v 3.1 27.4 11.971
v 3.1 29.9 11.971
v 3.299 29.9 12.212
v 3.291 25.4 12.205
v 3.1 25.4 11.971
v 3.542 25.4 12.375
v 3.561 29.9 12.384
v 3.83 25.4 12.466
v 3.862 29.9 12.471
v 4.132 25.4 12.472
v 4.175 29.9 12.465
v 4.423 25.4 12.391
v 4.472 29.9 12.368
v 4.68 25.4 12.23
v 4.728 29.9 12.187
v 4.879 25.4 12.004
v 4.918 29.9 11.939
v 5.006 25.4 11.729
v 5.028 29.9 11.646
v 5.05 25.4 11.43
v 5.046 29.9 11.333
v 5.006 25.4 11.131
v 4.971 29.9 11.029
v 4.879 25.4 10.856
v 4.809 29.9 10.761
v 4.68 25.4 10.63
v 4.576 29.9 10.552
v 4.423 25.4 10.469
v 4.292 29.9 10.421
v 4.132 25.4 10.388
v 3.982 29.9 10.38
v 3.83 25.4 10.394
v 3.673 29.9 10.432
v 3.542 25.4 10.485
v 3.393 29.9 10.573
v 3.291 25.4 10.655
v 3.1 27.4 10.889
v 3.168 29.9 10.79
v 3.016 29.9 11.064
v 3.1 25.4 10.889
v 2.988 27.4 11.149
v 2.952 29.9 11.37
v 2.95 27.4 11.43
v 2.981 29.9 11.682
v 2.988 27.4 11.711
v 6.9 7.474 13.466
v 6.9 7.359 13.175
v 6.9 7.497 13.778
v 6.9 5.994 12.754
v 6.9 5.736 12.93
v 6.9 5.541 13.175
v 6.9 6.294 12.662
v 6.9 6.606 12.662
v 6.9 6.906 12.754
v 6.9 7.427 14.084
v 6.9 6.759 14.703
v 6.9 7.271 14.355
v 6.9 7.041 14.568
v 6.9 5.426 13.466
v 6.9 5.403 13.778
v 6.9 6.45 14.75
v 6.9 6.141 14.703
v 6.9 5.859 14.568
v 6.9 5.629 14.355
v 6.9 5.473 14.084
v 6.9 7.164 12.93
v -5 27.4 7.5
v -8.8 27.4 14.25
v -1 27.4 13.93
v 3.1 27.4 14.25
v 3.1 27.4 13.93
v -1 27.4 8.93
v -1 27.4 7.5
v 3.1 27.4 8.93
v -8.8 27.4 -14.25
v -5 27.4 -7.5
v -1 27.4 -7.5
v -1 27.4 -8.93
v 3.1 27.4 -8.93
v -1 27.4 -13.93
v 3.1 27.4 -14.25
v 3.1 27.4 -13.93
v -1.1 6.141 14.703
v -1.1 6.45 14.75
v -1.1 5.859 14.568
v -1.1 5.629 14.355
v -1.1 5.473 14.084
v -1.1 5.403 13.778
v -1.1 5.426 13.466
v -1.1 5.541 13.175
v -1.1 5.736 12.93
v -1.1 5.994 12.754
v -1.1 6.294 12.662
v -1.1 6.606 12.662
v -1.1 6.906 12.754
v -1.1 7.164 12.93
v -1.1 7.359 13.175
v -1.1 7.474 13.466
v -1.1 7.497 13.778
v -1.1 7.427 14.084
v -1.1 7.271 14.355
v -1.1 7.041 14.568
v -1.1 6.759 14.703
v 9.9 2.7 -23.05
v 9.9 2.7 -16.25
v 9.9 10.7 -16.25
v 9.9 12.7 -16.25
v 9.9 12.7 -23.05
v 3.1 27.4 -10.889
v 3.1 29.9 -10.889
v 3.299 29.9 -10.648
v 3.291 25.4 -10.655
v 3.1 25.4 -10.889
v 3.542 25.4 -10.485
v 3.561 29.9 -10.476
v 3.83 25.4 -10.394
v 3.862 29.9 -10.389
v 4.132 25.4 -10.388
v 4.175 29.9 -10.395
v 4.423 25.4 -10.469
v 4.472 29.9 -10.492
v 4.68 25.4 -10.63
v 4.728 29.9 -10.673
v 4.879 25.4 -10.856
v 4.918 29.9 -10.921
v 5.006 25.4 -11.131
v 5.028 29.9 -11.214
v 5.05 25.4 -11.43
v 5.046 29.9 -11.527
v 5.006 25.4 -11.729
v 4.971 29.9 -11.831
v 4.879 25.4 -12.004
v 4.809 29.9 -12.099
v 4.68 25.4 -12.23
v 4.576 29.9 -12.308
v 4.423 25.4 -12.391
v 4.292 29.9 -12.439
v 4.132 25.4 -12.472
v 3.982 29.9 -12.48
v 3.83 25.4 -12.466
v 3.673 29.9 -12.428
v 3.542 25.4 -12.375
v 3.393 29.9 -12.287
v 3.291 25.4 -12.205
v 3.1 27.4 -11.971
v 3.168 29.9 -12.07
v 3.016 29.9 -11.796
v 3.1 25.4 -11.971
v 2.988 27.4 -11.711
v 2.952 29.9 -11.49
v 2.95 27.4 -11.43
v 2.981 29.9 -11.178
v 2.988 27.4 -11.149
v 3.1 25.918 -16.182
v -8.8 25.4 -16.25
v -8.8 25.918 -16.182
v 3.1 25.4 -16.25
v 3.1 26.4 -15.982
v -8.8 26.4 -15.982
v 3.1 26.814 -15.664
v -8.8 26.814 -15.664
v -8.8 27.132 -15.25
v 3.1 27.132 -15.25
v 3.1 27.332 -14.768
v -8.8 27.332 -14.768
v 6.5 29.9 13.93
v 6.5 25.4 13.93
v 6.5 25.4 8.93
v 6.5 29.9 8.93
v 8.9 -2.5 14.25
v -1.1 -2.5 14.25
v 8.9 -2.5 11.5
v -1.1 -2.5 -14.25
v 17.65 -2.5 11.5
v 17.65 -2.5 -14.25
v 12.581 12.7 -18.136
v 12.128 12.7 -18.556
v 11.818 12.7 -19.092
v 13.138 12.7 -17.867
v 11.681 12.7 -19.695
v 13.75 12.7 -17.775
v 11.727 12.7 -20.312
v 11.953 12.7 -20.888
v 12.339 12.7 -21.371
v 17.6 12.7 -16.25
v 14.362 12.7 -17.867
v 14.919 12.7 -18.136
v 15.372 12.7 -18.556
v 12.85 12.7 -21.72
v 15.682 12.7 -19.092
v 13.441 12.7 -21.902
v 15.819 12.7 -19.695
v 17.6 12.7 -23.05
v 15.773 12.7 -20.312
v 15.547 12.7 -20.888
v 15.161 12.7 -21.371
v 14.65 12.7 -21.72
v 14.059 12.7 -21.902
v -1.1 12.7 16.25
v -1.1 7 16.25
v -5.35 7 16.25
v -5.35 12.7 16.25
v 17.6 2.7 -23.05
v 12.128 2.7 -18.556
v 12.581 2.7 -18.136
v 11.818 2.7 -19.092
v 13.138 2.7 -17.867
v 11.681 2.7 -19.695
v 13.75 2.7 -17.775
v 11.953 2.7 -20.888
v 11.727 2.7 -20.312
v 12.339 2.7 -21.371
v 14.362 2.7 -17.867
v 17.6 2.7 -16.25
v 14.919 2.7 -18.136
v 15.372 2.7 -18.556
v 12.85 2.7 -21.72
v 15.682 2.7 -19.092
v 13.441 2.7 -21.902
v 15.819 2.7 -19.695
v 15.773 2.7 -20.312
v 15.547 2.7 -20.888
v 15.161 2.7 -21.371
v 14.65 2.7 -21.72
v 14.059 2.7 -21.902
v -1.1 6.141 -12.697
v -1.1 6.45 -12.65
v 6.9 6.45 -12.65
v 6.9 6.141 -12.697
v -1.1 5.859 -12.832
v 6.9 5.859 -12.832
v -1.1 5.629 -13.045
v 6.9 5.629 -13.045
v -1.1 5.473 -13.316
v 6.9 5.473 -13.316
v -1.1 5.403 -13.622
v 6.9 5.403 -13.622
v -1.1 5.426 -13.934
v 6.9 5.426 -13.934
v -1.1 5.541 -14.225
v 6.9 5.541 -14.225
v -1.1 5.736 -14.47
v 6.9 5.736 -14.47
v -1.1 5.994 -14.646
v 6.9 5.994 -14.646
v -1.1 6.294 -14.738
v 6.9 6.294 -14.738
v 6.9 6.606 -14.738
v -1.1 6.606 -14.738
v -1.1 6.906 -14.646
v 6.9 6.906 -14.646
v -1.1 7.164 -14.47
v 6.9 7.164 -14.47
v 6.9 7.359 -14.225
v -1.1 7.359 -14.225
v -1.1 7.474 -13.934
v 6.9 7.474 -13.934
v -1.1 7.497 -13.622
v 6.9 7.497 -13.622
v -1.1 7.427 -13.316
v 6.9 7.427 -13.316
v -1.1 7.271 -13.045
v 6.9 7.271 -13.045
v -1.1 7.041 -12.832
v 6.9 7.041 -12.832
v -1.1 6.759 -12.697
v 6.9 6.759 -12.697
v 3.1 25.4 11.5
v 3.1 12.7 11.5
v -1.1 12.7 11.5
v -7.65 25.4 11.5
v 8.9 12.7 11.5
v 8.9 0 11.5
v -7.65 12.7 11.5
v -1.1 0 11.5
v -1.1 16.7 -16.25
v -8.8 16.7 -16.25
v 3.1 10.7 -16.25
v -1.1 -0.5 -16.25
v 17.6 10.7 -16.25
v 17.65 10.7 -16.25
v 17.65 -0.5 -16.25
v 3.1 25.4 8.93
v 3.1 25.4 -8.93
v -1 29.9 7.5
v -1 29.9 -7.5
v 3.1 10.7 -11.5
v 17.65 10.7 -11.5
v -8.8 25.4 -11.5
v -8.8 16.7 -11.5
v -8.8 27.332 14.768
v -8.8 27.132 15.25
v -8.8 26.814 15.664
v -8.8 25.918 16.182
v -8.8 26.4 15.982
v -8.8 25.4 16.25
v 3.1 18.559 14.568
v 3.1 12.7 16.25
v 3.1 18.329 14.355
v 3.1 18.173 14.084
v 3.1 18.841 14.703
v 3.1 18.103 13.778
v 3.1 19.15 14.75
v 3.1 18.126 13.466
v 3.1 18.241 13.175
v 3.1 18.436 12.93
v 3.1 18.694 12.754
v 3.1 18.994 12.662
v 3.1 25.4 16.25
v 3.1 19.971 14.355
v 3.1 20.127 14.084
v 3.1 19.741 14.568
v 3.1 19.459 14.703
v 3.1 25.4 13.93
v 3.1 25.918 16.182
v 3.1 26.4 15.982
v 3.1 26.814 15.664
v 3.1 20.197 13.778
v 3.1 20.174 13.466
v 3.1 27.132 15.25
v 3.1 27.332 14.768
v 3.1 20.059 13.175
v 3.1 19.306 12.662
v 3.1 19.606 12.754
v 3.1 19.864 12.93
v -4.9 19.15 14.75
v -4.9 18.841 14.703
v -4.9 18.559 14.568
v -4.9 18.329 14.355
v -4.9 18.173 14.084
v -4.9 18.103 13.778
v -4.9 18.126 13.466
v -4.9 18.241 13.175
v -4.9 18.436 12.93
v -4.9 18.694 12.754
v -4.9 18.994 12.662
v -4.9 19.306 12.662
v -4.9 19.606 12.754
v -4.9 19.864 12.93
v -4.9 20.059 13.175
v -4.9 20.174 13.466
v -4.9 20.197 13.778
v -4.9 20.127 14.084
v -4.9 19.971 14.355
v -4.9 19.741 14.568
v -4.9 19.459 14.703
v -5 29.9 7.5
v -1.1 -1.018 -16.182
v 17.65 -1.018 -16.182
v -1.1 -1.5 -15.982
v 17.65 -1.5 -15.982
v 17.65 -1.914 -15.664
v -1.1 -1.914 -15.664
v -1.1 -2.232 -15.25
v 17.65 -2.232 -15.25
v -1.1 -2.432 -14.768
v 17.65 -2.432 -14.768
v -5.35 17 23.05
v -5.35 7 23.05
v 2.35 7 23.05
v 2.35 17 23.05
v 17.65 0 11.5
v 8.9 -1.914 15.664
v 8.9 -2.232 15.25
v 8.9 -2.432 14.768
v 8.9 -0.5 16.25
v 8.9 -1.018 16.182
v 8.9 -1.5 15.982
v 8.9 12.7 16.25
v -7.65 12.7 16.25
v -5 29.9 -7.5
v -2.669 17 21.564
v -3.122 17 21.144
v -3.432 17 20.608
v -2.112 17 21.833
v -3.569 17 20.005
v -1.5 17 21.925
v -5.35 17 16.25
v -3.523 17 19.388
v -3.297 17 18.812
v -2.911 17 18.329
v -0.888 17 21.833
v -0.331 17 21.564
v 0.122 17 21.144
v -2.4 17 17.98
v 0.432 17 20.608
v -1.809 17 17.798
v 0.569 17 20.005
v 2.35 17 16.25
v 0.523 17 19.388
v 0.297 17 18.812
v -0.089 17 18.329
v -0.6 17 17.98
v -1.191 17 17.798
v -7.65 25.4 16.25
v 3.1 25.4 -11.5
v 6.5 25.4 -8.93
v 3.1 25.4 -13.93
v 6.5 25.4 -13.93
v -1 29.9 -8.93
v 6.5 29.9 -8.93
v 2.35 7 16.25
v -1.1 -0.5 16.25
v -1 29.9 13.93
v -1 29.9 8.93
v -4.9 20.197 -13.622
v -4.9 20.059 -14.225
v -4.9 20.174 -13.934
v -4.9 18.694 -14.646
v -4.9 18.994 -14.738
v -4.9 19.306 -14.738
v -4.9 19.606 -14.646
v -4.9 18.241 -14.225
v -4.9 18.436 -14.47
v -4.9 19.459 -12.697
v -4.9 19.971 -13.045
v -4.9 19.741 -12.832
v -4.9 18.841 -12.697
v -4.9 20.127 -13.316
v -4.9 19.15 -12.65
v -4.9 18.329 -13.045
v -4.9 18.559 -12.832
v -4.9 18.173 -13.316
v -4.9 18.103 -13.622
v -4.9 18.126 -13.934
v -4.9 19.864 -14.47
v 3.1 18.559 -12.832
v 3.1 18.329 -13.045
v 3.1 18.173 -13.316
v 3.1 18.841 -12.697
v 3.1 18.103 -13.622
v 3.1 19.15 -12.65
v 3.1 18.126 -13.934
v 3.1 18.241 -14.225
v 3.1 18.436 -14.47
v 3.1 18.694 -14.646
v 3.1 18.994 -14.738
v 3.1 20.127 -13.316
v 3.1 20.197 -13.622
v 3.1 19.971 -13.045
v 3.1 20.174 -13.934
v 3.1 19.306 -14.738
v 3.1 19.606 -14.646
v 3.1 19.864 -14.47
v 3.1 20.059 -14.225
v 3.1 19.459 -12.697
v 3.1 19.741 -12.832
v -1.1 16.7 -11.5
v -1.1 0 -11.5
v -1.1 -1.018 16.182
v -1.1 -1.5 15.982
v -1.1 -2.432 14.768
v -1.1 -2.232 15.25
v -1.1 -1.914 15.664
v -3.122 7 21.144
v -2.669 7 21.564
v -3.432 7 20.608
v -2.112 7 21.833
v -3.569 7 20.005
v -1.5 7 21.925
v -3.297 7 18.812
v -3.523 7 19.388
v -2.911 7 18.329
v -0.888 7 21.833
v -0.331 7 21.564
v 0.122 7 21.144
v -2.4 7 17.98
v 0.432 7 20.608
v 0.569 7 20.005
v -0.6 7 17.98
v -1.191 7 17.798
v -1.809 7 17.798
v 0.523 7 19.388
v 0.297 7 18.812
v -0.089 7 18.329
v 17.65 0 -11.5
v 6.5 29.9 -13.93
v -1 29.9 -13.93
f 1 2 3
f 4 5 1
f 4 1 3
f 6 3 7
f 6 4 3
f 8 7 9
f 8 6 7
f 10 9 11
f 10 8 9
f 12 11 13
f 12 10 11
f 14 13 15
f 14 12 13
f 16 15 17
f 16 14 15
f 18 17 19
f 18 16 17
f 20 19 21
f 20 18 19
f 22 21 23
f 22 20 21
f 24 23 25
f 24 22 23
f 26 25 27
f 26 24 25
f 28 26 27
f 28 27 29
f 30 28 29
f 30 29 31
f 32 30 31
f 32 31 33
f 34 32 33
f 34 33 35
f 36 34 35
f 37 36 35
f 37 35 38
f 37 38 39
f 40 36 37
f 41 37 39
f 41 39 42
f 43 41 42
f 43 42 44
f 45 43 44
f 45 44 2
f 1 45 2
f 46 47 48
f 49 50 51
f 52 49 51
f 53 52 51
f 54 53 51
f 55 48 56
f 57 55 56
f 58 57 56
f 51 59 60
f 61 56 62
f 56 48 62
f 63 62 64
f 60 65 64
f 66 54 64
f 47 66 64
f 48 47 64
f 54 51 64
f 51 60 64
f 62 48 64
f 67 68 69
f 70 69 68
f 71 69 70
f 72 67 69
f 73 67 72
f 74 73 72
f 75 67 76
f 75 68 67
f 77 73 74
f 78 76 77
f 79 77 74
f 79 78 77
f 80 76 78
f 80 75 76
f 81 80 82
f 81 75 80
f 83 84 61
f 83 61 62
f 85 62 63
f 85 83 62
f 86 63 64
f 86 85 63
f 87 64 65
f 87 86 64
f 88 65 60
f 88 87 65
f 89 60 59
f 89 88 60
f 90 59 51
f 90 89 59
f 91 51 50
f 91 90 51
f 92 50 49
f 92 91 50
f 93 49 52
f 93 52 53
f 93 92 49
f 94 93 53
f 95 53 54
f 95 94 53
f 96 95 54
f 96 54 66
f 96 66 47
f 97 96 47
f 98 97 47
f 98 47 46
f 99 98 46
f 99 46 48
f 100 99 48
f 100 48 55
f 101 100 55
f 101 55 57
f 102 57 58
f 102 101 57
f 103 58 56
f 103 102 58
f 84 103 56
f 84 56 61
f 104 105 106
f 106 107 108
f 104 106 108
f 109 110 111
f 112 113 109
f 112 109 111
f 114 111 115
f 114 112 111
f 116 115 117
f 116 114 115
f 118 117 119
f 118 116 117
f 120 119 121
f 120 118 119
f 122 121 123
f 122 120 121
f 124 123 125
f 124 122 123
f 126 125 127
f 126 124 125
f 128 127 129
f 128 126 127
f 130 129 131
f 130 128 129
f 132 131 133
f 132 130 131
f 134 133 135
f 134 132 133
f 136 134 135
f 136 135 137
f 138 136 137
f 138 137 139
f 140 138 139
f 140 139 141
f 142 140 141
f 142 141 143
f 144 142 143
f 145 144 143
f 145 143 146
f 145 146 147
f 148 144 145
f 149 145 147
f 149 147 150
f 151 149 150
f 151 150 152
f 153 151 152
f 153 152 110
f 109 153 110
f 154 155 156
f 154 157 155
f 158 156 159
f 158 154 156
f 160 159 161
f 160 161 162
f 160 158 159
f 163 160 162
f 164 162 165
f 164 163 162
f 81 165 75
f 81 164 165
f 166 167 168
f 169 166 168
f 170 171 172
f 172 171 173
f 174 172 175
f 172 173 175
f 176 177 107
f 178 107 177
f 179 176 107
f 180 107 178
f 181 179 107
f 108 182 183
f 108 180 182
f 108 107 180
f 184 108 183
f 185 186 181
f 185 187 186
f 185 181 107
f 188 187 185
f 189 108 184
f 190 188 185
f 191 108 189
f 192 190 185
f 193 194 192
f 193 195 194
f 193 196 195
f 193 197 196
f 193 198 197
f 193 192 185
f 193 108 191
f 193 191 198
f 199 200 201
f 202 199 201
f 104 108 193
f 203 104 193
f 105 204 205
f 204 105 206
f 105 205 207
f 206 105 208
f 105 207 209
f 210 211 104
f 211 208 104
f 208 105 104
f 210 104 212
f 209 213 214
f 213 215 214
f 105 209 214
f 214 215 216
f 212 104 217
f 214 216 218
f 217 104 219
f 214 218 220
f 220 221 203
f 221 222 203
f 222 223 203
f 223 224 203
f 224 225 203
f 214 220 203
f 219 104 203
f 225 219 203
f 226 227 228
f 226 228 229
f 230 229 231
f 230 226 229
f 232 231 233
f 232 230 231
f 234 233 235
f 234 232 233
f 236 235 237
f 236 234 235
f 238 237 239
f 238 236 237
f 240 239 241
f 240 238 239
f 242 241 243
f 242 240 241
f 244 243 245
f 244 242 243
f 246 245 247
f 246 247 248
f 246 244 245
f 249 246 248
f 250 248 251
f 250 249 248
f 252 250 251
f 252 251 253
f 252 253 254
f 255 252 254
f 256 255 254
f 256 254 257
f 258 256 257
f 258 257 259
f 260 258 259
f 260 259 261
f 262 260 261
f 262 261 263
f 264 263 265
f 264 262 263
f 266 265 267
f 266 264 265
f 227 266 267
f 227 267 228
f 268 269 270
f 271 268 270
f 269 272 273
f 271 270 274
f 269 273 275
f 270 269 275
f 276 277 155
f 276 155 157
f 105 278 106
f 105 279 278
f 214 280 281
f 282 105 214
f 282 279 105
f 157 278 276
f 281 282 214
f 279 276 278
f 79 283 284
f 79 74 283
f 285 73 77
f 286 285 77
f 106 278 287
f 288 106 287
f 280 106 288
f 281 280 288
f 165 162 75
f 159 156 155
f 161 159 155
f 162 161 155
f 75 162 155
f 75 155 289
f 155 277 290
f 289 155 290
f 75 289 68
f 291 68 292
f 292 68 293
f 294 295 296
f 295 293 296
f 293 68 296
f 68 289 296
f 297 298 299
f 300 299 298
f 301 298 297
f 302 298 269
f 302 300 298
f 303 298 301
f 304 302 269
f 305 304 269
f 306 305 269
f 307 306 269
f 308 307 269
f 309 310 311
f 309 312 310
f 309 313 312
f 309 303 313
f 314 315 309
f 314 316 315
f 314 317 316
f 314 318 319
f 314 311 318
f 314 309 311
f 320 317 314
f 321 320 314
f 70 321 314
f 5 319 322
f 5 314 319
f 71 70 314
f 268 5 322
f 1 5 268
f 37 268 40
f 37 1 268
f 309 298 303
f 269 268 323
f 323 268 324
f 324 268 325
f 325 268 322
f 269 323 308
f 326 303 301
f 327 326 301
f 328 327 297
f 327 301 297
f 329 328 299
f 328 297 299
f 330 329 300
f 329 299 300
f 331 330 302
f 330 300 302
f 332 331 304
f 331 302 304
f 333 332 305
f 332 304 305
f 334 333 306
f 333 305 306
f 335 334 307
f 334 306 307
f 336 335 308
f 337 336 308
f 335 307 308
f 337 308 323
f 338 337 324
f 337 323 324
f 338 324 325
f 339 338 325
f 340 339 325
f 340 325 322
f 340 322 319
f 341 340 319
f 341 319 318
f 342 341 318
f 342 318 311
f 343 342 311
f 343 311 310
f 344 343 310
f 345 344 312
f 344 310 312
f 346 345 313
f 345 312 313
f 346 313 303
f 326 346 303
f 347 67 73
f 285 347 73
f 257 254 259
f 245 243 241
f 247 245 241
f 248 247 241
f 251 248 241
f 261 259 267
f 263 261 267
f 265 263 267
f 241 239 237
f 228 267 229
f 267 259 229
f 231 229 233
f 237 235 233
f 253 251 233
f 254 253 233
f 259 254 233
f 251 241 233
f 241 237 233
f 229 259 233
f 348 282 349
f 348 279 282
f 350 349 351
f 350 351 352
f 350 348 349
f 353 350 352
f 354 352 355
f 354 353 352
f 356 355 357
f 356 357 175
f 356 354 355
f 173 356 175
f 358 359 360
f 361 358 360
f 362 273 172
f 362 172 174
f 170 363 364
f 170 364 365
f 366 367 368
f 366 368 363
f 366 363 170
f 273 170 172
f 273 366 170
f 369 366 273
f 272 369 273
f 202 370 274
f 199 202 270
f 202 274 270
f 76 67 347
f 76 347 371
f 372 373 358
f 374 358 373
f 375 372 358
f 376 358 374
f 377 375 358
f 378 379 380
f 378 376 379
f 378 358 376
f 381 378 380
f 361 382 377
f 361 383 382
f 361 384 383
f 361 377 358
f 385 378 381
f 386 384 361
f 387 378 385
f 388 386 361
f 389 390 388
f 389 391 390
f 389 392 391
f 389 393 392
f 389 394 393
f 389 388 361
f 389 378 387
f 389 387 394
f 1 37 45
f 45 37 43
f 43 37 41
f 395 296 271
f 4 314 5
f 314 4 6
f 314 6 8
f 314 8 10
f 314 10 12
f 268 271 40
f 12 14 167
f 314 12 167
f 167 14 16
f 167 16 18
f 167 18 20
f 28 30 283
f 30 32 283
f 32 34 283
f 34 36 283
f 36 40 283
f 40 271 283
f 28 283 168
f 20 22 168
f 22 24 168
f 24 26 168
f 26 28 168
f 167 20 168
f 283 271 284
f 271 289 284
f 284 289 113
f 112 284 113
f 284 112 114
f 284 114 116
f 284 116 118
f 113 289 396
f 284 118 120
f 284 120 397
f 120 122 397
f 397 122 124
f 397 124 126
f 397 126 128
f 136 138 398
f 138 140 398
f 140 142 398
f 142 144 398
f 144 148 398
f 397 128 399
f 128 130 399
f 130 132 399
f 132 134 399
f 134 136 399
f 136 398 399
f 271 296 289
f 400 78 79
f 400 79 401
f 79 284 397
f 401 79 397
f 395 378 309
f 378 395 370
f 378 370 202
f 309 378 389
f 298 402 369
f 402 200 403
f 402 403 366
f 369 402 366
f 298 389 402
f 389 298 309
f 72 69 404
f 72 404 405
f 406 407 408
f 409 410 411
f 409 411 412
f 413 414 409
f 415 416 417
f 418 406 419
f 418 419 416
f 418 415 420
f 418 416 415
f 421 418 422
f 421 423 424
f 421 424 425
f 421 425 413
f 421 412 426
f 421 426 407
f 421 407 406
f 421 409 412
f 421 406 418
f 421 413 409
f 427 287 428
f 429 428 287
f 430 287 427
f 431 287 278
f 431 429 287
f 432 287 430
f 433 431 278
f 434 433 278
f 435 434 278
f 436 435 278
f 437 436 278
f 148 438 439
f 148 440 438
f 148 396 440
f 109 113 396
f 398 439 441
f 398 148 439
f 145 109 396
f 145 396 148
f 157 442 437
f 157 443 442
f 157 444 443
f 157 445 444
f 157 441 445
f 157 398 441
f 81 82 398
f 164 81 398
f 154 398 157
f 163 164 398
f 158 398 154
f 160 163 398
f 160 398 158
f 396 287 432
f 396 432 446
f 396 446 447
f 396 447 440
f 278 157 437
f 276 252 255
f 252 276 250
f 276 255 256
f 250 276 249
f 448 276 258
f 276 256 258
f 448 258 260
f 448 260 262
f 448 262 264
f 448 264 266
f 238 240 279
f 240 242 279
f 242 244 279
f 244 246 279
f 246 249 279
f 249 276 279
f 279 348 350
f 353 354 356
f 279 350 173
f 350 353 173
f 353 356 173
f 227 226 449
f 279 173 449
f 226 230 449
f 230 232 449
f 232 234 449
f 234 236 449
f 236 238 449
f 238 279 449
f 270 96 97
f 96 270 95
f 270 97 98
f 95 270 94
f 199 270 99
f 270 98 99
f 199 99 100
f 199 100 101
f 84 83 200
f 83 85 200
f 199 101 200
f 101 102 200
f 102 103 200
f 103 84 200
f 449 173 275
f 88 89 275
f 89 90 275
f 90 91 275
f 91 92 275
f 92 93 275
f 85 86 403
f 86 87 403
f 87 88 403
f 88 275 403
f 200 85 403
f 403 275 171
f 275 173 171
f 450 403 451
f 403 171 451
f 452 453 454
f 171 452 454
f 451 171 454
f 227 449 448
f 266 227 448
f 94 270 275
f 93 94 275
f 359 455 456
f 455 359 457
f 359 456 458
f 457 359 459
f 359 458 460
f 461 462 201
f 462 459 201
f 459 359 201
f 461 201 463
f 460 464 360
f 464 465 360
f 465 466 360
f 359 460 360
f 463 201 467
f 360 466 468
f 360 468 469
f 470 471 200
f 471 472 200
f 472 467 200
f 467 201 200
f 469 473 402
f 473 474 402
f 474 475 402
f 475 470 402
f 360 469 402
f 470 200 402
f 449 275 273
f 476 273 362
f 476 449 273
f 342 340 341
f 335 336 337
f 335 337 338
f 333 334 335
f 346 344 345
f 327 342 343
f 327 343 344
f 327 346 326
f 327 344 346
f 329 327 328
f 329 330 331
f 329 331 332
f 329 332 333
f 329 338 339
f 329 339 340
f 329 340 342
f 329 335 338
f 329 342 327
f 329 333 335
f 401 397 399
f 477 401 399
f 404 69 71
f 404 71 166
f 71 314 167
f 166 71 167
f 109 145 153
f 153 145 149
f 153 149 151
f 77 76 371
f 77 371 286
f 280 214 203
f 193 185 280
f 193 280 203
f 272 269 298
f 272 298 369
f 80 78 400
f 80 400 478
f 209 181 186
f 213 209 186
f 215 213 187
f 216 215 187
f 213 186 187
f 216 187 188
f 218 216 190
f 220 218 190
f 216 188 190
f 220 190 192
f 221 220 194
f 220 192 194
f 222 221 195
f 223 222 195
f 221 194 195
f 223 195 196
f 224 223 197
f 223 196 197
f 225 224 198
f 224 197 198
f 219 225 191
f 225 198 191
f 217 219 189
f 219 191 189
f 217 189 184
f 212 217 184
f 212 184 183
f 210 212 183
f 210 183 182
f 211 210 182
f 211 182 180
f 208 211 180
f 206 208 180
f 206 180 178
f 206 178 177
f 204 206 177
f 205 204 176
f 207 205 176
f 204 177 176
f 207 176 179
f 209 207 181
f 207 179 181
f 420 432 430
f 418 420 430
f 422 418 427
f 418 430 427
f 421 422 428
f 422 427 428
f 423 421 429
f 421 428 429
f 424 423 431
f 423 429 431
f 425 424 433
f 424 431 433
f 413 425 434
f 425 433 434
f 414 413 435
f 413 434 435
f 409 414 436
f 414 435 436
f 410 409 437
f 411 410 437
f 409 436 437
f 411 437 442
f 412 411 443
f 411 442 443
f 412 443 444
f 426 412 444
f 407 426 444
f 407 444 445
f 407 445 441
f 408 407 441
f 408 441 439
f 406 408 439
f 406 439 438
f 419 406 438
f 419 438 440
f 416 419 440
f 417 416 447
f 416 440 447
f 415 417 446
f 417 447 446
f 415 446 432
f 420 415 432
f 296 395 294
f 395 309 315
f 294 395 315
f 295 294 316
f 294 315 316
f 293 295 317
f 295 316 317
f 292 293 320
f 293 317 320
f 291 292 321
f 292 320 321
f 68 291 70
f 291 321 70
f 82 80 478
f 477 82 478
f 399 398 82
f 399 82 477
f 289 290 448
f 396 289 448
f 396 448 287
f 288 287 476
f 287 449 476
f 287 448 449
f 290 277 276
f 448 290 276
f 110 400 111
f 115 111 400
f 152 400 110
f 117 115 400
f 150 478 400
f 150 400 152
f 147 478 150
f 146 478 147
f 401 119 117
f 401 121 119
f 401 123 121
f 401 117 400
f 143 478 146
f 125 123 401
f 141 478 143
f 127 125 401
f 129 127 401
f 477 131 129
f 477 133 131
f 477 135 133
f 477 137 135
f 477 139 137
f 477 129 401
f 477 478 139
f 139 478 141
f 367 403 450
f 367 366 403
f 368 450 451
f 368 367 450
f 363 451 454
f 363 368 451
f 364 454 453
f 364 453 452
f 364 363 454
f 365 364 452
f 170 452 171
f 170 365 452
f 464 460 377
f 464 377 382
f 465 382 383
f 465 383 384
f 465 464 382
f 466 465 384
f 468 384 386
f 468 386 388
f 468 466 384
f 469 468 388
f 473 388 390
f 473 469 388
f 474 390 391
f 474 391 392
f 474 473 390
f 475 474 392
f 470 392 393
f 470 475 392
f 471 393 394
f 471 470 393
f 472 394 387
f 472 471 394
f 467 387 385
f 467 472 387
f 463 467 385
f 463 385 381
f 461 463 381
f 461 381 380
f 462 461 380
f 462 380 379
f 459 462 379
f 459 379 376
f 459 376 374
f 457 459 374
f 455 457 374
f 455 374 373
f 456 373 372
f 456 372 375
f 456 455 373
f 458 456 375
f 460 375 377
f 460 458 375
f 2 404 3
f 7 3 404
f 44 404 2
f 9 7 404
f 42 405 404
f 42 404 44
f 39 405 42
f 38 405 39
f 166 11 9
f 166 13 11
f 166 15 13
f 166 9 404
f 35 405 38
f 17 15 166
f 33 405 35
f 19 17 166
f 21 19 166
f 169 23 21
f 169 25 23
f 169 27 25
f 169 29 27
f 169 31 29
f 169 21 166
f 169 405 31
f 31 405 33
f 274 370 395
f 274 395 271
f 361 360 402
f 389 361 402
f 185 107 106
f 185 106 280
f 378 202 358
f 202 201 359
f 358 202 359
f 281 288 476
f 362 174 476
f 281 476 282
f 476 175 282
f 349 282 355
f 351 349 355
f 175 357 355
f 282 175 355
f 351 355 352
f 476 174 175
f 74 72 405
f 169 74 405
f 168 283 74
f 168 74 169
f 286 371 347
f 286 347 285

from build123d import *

# Parameters (mm, degrees)
BOSS_EXTRUDE1_DEPTH      = 2.5
BOSS_EXTRUDE2_DEPTH      = 12.7
BOSS_EXTRUDE3_START      = 12.7
SKETCH3_W                = 11.9
SKETCH3_H                = 4.75
SKETCH3_W_2              = 10.75
BOSS_EXTRUDE3_DEPTH      = 12.7
BOSS_EXTRUDE4_START      = 25.4
SKETCH3_3_W              = 11.9
SKETCH3_3_H              = 4.75
SKETCH3_3_W_2            = 10.75
SKETCH3_3_W_3            = 1.15
BOSS_EXTRUDE4_DEPTH      = 2
CUT_EXTRUDE1_START       = -1.1
SKETCH2_R                = 1.05
CUT_EXTRUDE1_DEPTH       = 8
CUT_EXTRUDE2_START       = 3.1
SKETCH2_3_R              = 1.05
CUT_EXTRUDE2_DEPTH       = 8
BOSS_EXTRUDE5_START      = 7
SKETCH1_4_R              = 2.075
BOSS_EXTRUDE5_DEPTH      = 10
BOSS_EXTRUDE6_START      = 12.7
SKETCH1_7_W              = 7.7
SKETCH1_7_H              = 6.8
SKETCH1_7_R              = 2.075
BOSS_EXTRUDE6_DEPTH      = 10
FILLET1_R                = 2
CUT_EXTRUDE3_START       = 12.7
SKETCH5_W                = 14.55
SKETCH5_H                = 4.75
CUT_EXTRUDE3_DEPTH       = 2
CUT_EXTRUDE4_START       = 12.7
SKETCH6_W                = 7.7
SKETCH6_H                = 4.75
CUT_EXTRUDE4_DEPTH       = 4
BOSS_EXTRUDE7_DEPTH      = 2.5
BOSS_EXTRUDE7_DEPTH_BACK = 2
BOSS_EXTRUDE7_START      = 27.4
SKETCH7_W                = 4
SKETCH7_H                = 15
SKETCH7_W_2              = 5
SKETCH7_H_2              = 5
SKETCH7_R                = 1.05
SKETCH7_W_3              = 2.5


with BuildPart() as part:
    # Sketch1 → Boss-Extrude1 (new body)
    with BuildSketch(Plane(origin=(0, 0, 0), x_dir=(1, 0, 0), z_dir=(0, 1, 0))):
        Polygon((-1.1, 16.25), (-1.1, -16.25), (8.9, -16.25), (8.9, -11.5), (17.65, -11.5), (17.65, 16.25), align=None)
    extrude(amount=-BOSS_EXTRUDE1_DEPTH)

    # Sketch1<3> → Boss-Extrude2 (add)
    with BuildSketch(Plane(origin=(0, 0, 0), x_dir=(1, 0, 0), z_dir=(0, 1, 0))):
        Polygon((9.9, 16.25), (-1.1, 16.25), (-1.1, 11.5), (17.65, 11.5), (17.65, 16.25), (17.6, 16.25), align=None)
        Polygon((8.9, -11.5), (-1.1, -11.5), (-1.1, -16.25), (2.35, -16.25), (8.9, -16.25), align=None)
    extrude(amount=BOSS_EXTRUDE2_DEPTH)

    # Sketch3 → Boss-Extrude3 (add)
    with BuildSketch(Plane(origin=(0, 0, 0), x_dir=(1, 0, 0), z_dir=(0, 1, 0)).offset(BOSS_EXTRUDE3_START)):
        with Locations((-2.85, 13.875)):
            Rectangle(SKETCH3_W, SKETCH3_H)
        with Locations((-2.275, -13.875)):
            Rectangle(SKETCH3_W_2, SKETCH3_H)
    extrude(amount=BOSS_EXTRUDE3_DEPTH)

    # Sketch3<3> → Boss-Extrude4 (add)
    with BuildSketch(Plane(origin=(0, 0, 0), x_dir=(1, 0, 0), z_dir=(0, 1, 0)).offset(BOSS_EXTRUDE4_START)):
        with Locations((-2.85, 13.875)):
            Rectangle(SKETCH3_3_W, SKETCH3_3_H)
        Polygon((3.1, -11.5), (3.1, 11.5), (-8.8, 11.5), (-8.8, -11.5), (-7.65, -11.5), align=None)
        with Locations((-2.275, -13.875)):
            Rectangle(SKETCH3_3_W_2, SKETCH3_3_H)
        with Locations((-8.225, -13.875)):
            Rectangle(SKETCH3_3_W_3, SKETCH3_3_H)
    extrude(amount=BOSS_EXTRUDE4_DEPTH)

    # Sketch2 → Cut-Extrude1 (cut)
    with BuildSketch(Plane(origin=(0, 0, 0), x_dir=(0, 0, -1), z_dir=(1, 0, 0)).offset(CUT_EXTRUDE1_START)):
        with Locations(Location((-13.7, 6.45, 0), (0, 0, 180))):
            Circle(SKETCH2_R)
        with Locations(Location((13.7, 6.45, 0), (0, 0, 180))):
            Circle(SKETCH2_R)
    extrude(amount=CUT_EXTRUDE1_DEPTH, mode=Mode.SUBTRACT)

    # Sketch2<3> → Cut-Extrude2 (cut)
    with BuildSketch(Plane(origin=(0, 0, 0), x_dir=(0, 0, -1), z_dir=(1, 0, 0)).offset(CUT_EXTRUDE2_START)):
        with Locations(Location((13.7, 19.15, 0), (0, 0, 180))):
            Circle(SKETCH2_3_R)
        with Locations(Location((-13.7, 19.15, 0), (0, 0, 180))):
            Circle(SKETCH2_3_R)
    extrude(amount=-CUT_EXTRUDE2_DEPTH, mode=Mode.SUBTRACT)

    # Sketch1<4> → Boss-Extrude5 (add)
    with BuildSketch(Plane(origin=(0, 0, 0), x_dir=(1, 0, 0), z_dir=(0, 1, 0)).offset(BOSS_EXTRUDE5_START)):
        Polygon((2.35, -16.25), (-1.1, -16.25), (-3.8, -16.25), (-5.35, -16.25), (-5.35, -23.05), (2.35, -23.05), align=None)
        with Locations(Location((-1.5, -19.85, 0), (0, 0, 270))):
            Circle(SKETCH1_4_R, mode=Mode.SUBTRACT)
    extrude(amount=BOSS_EXTRUDE5_DEPTH)

    # Sketch1<7> → Boss-Extrude6 (add)
    with BuildSketch(Plane(origin=(0, 0, 0), x_dir=(1, 0, 0), z_dir=(0, 1, 0)).offset(BOSS_EXTRUDE6_START)):
        with Locations((13.75, 19.65)):
            Rectangle(SKETCH1_7_W, SKETCH1_7_H)
        with Locations(Location((13.75, 19.85, 0), (0, 0, 270))):
            Circle(SKETCH1_7_R, mode=Mode.SUBTRACT)
    extrude(amount=-BOSS_EXTRUDE6_DEPTH)

    # Fillet1
    fillet1_edges = [part.edges().sort_by_distance(p)[0] for p in [
        (3.9, -2.5, 16.25),
        (-2.85, 27.4, 16.25),
        (8.275, -2.5, -16.25),
        (-2.85, 27.4, -16.25),
    ]]
    fillet(fillet1_edges, radius=FILLET1_R)

    # Sketch5 → Cut-Extrude3 (cut)
    with BuildSketch(Plane(origin=(0, 0, 0), x_dir=(1, 0, 0), z_dir=(0, 1, 0)).offset(CUT_EXTRUDE3_START)):
        with Locations((10.375, 13.875)):
            Rectangle(SKETCH5_W, SKETCH5_H)
    extrude(amount=-CUT_EXTRUDE3_DEPTH, mode=Mode.SUBTRACT)

    # Sketch6 → Cut-Extrude4 (cut)
    with BuildSketch(Plane(origin=(0, 0, 0), x_dir=(1, 0, 0), z_dir=(0, 1, 0)).offset(CUT_EXTRUDE4_START)):
        with Locations((-4.95, 13.875)):
            Rectangle(SKETCH6_W, SKETCH6_H)
    extrude(amount=CUT_EXTRUDE4_DEPTH, mode=Mode.SUBTRACT)

    # Sketch7 → Boss-Extrude7 (add, two sides: drawn at the far end of the back side and taken through both)
    # profile 1 of 5: a face of its own
    with BuildSketch(Plane(origin=(0, 0, 0), x_dir=(1, 0, 0), z_dir=(0, 1, 0)).offset(BOSS_EXTRUDE7_START - BOSS_EXTRUDE7_DEPTH_BACK)):
        with Locations((-3, 0)):
            Rectangle(SKETCH7_W, SKETCH7_H)
    # profile 2 of 5: a face of its own
    with BuildSketch(Plane(origin=(0, 0, 0), x_dir=(1, 0, 0), z_dir=(0, 1, 0)).offset(BOSS_EXTRUDE7_START - BOSS_EXTRUDE7_DEPTH_BACK)):
        with Locations((4, -11.43)):
            Rectangle(SKETCH7_W_2, SKETCH7_H_2)
        with Locations(Location((4, -11.43, 0), (0, 0, 211.002719134))):
            Circle(SKETCH7_R, mode=Mode.SUBTRACT)
    # profile 3 of 5: a face of its own
    with BuildSketch(Plane(origin=(0, 0, 0), x_dir=(1, 0, 0), z_dir=(0, 1, 0)).offset(BOSS_EXTRUDE7_START - BOSS_EXTRUDE7_DEPTH_BACK)):
        with Locations((0.25, -11.43)):
            Rectangle(SKETCH7_W_3, SKETCH7_H_2)
    # profile 4 of 5: a face of its own
    with BuildSketch(Plane(origin=(0, 0, 0), x_dir=(1, 0, 0), z_dir=(0, 1, 0)).offset(BOSS_EXTRUDE7_START - BOSS_EXTRUDE7_DEPTH_BACK)):
        with Locations((0.25, 11.43)):
            Rectangle(SKETCH7_W_3, SKETCH7_H_2)
    # profile 5 of 5: a face of its own
    with BuildSketch(Plane(origin=(0, 0, 0), x_dir=(1, 0, 0), z_dir=(0, 1, 0)).offset(BOSS_EXTRUDE7_START - BOSS_EXTRUDE7_DEPTH_BACK)):
        with Locations((4, 11.43)):
            Rectangle(SKETCH7_W_2, SKETCH7_H_2)
        with Locations(Location((4, 11.43, 0), (0, 0, 211.002719134))):
            Circle(SKETCH7_R, mode=Mode.SUBTRACT)
    extrude(amount=BOSS_EXTRUDE7_DEPTH + BOSS_EXTRUDE7_DEPTH_BACK)


solid = part.part
